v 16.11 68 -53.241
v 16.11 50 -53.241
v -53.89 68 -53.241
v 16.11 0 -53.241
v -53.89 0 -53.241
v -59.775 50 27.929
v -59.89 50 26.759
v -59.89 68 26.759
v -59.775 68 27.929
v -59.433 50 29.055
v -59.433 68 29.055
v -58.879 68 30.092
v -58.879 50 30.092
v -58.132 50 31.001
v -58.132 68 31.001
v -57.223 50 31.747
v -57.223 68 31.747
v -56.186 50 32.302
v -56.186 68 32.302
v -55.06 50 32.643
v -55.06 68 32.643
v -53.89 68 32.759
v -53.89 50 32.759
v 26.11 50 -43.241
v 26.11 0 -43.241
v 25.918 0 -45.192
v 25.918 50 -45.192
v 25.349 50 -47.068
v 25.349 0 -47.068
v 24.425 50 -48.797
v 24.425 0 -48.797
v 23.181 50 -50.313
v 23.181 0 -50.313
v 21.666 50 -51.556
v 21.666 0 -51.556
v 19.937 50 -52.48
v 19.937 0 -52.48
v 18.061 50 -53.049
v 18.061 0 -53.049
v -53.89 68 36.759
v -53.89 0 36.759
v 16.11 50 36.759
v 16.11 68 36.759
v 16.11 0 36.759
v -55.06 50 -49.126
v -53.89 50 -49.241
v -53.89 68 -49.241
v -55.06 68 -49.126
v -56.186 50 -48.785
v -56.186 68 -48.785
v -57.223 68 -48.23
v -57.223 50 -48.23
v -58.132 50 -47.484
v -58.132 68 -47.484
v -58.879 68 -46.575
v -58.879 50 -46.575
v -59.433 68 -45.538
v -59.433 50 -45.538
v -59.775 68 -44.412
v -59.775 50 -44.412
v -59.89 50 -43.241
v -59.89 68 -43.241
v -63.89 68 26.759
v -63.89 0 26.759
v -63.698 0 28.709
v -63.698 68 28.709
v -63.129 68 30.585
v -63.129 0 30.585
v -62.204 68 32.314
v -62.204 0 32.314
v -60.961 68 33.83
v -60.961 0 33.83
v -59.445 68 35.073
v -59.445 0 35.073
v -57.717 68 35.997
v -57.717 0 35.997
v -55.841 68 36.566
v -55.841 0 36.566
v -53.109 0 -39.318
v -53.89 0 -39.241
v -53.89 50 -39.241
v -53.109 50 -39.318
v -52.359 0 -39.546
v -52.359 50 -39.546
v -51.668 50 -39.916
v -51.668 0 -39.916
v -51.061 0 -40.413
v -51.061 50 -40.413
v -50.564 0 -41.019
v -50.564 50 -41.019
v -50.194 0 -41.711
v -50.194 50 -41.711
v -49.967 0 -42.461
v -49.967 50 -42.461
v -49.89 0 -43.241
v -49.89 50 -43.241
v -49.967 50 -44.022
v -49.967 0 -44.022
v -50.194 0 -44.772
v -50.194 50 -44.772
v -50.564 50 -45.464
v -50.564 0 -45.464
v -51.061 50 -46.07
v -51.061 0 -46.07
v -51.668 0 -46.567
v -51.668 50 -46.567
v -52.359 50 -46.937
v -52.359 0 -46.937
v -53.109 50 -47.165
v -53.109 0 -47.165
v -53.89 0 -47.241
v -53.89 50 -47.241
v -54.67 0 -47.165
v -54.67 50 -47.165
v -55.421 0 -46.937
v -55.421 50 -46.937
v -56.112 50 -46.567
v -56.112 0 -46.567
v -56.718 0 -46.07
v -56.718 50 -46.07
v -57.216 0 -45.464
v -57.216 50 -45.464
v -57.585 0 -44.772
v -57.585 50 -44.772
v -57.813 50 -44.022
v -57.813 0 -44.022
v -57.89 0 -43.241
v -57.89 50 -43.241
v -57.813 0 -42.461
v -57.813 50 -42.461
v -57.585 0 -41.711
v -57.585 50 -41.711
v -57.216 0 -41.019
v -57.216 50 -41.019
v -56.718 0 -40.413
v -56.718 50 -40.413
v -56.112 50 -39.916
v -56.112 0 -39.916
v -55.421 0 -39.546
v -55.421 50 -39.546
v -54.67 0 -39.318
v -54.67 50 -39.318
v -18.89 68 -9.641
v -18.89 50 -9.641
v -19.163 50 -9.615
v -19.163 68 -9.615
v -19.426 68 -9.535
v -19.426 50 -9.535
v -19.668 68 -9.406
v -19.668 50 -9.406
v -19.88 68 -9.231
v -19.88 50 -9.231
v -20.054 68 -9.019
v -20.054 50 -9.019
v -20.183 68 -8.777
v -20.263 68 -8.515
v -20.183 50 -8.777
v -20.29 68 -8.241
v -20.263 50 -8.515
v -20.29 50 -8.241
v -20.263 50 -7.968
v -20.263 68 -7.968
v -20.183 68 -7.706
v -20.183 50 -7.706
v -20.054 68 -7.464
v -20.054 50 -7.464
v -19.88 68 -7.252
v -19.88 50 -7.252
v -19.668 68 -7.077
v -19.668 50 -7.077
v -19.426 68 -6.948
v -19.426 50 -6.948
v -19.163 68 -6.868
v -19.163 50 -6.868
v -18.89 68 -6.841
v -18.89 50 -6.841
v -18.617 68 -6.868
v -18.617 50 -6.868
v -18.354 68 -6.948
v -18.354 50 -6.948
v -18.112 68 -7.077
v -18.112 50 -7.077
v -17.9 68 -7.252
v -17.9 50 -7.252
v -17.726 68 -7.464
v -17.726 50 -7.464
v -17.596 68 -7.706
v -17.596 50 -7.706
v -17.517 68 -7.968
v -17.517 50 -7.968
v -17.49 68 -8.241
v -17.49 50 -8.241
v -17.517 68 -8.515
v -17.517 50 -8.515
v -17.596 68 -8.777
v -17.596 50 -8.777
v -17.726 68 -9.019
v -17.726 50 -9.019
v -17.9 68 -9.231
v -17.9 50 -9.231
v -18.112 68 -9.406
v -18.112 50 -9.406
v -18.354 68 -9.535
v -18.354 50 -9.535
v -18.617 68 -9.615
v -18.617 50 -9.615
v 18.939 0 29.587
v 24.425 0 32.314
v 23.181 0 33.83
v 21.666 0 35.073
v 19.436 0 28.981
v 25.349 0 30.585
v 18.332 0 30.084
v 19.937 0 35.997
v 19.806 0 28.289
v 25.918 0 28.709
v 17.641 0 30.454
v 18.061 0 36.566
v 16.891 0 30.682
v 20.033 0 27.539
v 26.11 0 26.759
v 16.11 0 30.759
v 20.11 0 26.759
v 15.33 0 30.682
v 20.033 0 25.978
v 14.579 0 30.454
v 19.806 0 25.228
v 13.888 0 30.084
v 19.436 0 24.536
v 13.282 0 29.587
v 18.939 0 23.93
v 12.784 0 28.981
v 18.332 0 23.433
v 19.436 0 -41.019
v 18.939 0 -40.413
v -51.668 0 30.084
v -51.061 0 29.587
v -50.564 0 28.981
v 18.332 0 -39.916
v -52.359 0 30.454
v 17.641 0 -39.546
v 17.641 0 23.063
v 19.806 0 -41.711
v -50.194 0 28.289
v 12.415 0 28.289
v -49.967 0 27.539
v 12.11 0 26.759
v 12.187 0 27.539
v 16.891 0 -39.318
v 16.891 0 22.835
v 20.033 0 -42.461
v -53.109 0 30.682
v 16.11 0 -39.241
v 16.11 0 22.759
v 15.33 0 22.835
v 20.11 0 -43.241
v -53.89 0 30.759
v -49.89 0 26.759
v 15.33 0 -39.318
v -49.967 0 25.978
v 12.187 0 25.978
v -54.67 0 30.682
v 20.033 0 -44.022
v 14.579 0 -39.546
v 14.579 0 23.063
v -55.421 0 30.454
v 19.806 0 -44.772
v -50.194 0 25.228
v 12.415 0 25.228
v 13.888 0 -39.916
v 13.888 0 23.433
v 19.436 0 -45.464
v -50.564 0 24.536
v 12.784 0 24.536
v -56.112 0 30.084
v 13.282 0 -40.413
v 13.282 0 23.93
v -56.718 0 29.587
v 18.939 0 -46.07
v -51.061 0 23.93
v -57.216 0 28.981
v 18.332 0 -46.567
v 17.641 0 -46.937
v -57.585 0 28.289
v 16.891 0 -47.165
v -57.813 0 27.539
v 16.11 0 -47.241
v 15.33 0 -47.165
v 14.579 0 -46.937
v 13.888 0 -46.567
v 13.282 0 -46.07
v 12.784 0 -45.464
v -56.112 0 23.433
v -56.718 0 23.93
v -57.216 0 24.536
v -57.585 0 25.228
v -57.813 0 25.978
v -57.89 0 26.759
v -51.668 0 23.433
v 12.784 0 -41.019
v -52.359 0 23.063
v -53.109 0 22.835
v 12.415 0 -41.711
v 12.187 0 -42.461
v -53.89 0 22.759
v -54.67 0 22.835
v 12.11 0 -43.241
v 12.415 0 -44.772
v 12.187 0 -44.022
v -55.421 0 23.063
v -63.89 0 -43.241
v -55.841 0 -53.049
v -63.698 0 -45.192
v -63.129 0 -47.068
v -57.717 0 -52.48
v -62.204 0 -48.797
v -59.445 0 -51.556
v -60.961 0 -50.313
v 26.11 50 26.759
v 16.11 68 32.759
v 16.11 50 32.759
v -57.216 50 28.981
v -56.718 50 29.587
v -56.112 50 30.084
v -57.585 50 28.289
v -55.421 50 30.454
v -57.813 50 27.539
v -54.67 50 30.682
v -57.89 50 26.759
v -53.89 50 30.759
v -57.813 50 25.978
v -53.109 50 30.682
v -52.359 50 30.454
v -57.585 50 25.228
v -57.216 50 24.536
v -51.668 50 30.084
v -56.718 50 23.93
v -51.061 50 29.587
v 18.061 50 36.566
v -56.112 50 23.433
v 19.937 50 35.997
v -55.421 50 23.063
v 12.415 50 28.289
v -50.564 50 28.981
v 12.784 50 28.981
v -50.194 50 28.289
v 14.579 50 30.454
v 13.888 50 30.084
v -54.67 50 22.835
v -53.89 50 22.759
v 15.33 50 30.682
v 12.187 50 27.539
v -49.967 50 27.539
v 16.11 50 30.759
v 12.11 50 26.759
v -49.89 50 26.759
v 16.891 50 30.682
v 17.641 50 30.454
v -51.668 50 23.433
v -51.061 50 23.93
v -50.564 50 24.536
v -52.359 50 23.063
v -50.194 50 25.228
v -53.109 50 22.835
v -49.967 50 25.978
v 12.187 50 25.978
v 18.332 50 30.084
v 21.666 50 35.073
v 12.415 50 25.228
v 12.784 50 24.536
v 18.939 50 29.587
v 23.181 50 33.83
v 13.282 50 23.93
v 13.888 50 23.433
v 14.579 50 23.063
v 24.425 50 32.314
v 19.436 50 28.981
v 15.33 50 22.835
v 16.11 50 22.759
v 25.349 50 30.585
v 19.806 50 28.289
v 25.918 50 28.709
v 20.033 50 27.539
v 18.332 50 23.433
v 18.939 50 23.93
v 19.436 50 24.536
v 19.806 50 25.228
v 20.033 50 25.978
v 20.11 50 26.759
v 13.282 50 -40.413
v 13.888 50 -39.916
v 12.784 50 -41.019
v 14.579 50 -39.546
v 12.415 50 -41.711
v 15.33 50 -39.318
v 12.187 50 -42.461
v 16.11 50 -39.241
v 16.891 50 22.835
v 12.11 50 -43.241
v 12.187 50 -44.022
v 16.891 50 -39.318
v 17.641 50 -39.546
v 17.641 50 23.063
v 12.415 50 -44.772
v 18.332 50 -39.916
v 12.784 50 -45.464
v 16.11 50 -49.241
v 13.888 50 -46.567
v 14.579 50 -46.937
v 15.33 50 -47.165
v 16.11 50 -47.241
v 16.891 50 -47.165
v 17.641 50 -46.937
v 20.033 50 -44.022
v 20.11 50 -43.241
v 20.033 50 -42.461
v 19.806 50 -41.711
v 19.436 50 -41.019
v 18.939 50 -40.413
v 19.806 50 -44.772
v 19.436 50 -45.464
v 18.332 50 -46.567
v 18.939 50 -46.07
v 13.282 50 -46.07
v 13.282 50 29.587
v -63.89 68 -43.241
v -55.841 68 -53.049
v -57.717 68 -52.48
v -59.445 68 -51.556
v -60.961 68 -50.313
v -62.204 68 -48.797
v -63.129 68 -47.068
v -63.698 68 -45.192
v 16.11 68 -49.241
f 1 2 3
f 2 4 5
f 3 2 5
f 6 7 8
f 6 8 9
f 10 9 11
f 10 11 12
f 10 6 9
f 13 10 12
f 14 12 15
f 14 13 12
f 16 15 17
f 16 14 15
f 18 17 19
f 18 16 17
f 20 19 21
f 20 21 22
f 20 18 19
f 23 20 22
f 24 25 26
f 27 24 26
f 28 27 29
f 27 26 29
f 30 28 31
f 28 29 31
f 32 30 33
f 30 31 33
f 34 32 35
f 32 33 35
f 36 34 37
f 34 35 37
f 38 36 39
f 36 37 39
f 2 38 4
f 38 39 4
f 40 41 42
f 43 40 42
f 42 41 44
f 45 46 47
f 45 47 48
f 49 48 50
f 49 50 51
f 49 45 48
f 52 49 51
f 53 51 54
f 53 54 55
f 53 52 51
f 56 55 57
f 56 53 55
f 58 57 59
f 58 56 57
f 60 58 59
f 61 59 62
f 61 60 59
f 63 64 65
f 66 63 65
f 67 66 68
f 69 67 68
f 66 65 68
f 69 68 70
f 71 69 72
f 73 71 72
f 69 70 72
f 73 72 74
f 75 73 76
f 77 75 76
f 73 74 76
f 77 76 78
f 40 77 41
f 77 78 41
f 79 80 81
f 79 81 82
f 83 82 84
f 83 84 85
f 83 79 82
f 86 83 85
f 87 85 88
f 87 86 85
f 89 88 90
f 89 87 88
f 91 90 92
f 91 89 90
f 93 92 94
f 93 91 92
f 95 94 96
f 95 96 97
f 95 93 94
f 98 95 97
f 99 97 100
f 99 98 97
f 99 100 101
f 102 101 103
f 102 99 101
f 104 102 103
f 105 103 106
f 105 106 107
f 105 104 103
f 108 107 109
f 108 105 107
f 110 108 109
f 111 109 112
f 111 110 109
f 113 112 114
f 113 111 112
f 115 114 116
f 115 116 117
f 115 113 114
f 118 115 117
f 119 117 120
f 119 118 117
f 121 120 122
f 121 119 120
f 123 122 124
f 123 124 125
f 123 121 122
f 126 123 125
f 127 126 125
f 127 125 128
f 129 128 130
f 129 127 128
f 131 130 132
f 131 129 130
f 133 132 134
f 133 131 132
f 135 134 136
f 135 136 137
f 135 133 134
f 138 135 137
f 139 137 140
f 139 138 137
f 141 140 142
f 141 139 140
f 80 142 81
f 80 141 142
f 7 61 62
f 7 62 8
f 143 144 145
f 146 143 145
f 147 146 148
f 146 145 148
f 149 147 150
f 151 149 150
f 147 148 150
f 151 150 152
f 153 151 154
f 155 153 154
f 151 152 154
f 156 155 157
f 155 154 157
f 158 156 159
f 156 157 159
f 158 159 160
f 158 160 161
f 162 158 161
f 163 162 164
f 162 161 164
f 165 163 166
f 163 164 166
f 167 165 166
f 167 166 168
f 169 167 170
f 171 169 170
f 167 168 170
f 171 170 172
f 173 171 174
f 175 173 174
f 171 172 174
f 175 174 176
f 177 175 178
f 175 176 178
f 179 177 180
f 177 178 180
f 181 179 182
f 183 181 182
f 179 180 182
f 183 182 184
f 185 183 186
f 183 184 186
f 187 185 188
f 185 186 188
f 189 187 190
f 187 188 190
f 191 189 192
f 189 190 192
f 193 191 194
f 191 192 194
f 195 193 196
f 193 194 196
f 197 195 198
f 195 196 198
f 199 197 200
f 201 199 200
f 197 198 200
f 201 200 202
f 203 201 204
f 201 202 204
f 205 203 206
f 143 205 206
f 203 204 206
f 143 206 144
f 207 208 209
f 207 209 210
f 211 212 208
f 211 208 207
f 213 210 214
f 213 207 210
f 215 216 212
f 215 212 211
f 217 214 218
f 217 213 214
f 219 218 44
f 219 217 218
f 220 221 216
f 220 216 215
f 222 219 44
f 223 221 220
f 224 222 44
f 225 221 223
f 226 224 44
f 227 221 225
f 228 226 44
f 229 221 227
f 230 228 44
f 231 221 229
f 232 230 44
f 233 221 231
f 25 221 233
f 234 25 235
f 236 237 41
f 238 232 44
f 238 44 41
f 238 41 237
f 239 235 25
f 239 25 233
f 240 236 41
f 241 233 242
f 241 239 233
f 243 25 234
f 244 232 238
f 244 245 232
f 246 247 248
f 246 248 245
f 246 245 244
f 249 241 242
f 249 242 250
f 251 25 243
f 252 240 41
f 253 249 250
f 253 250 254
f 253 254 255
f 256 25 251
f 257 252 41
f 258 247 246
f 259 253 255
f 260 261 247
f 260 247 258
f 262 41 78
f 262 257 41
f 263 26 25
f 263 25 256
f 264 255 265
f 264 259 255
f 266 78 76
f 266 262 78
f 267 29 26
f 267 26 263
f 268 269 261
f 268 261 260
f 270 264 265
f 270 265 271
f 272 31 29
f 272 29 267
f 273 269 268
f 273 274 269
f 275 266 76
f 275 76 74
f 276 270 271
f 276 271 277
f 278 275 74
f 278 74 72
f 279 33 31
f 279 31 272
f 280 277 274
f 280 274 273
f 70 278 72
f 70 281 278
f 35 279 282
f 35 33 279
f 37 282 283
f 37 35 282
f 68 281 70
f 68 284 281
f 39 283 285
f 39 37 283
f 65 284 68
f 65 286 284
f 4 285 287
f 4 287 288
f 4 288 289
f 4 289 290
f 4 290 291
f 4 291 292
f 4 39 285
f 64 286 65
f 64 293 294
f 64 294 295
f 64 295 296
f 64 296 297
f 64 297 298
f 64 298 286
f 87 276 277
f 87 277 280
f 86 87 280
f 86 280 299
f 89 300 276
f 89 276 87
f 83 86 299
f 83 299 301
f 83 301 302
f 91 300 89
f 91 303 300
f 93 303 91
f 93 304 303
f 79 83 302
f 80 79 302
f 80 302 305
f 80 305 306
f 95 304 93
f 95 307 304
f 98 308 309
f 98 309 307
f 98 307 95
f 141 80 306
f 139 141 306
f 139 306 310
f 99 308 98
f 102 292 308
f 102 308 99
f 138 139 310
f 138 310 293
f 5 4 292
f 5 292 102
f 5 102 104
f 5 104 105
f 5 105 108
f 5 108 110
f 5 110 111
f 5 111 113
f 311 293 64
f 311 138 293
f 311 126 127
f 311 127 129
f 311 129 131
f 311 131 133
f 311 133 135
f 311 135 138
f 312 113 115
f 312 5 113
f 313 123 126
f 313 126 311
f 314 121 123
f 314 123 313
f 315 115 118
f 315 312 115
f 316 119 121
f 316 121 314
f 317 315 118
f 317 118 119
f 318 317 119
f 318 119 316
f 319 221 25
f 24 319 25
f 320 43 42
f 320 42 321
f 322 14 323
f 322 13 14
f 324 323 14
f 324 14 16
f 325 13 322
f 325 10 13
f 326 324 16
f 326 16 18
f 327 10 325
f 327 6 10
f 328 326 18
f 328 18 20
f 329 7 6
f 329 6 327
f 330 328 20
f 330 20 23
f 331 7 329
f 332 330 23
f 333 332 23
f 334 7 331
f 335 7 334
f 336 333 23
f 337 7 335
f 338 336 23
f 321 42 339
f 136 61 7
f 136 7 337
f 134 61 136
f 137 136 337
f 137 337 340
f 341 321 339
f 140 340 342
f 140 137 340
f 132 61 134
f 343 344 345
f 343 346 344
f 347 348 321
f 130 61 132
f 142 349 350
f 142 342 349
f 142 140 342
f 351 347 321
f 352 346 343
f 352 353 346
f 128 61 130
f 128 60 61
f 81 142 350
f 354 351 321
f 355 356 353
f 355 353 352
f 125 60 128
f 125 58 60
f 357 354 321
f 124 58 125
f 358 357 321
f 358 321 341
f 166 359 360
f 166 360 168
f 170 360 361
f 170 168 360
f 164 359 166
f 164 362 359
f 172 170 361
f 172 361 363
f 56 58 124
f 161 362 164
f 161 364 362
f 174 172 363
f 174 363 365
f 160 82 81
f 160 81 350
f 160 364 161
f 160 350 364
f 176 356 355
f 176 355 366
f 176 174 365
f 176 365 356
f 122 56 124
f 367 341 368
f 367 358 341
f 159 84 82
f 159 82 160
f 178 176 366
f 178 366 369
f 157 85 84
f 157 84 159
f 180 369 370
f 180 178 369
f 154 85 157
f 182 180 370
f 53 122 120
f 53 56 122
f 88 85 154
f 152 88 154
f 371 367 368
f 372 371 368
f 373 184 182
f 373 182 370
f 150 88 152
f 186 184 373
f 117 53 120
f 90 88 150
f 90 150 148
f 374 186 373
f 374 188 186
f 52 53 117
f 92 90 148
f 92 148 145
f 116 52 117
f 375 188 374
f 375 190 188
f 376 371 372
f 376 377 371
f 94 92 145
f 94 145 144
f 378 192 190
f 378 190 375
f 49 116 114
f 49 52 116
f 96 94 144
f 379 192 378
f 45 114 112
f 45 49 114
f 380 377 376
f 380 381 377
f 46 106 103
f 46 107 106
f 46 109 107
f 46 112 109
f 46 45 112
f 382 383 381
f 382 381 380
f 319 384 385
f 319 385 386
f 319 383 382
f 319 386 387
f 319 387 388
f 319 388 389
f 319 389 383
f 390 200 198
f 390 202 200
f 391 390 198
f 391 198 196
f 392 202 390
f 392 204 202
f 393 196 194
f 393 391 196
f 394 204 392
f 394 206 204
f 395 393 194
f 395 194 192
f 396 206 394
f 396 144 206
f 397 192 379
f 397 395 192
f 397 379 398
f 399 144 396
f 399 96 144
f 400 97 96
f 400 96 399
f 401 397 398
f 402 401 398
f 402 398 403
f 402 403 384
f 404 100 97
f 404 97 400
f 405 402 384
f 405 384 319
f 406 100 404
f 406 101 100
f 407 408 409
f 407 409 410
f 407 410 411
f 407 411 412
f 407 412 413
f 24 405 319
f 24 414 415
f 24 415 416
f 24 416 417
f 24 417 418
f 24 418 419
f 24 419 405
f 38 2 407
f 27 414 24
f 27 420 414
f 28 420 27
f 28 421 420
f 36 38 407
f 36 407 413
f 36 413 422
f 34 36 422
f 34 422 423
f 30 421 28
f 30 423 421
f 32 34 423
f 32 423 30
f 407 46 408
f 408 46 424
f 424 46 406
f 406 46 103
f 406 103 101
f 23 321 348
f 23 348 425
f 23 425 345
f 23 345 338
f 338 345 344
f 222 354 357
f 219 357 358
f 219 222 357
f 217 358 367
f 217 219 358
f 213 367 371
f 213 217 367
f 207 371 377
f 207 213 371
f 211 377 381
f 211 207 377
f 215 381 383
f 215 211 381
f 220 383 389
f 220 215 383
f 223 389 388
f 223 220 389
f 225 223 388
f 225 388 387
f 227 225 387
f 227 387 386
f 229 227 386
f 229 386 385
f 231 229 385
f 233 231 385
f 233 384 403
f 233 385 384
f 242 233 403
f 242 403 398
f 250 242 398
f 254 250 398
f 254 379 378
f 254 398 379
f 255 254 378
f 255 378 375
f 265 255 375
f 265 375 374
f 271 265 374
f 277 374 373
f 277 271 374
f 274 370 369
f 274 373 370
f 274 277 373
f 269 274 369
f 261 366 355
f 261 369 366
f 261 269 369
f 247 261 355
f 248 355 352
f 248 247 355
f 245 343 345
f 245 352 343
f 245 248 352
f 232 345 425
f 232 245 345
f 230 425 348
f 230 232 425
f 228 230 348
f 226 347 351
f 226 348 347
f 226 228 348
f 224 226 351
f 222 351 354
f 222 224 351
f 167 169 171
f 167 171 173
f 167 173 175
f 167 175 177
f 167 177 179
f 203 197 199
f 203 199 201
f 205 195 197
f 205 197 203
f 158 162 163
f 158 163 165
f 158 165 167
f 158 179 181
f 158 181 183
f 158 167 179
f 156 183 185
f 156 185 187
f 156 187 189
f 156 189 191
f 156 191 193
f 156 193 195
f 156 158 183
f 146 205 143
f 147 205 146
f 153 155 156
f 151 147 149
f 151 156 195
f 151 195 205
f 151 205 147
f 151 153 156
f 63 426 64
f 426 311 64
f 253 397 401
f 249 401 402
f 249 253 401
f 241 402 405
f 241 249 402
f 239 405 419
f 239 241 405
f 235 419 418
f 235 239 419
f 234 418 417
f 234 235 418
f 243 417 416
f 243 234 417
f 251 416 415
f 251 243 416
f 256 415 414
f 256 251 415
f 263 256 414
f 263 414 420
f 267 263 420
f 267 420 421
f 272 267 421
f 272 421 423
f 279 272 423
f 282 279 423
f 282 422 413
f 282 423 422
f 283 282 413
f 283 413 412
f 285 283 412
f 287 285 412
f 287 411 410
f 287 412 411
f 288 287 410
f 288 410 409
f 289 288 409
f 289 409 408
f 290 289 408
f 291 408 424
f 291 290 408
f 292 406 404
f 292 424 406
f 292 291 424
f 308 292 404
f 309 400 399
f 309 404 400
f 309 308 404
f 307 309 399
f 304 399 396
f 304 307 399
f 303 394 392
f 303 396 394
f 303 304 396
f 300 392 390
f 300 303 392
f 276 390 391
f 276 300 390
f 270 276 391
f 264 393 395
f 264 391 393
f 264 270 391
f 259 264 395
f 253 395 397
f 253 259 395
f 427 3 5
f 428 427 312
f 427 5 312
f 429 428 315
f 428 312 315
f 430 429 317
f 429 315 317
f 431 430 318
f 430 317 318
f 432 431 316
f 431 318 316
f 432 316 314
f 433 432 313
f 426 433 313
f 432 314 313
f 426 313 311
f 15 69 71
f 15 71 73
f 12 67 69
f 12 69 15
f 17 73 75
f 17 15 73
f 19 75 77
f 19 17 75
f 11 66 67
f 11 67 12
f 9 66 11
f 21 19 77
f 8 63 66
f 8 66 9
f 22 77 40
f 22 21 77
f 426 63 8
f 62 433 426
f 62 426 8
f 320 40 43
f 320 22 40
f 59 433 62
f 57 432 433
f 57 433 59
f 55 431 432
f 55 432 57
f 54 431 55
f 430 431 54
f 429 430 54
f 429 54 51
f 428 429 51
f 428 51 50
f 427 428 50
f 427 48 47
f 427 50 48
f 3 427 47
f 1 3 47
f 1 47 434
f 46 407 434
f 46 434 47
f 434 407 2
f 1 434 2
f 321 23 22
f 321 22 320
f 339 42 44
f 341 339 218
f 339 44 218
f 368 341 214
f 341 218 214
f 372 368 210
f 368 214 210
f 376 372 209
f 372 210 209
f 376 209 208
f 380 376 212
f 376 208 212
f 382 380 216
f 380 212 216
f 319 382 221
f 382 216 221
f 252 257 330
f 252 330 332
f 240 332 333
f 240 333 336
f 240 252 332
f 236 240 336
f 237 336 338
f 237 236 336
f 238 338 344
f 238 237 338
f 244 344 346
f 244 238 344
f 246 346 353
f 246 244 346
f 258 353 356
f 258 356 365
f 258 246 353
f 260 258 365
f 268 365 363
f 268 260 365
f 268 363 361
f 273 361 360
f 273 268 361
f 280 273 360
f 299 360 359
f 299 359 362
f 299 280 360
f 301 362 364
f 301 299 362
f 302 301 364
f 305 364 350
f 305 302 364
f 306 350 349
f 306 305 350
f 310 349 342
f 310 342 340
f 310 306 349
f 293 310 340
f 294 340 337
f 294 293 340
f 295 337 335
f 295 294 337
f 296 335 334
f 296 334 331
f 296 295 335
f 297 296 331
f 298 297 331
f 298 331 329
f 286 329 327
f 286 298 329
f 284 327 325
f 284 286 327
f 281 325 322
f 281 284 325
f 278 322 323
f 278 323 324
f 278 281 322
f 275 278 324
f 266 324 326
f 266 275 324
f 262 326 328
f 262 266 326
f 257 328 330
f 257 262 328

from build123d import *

# Parameters (mm, degrees)
SKETCH1_R           = 4
BOSS_EXTRUDE1_DEPTH = 50
EXTRUDE_THIN1_DEPTH = 18
SKETCH3_R           = 1.4
BOSS_EXTRUDE2_DEPTH = 18
SKETCH4_W           = 4.41201188
SKETCH4_H           = 70
CUT_EXTRUDE1_DEPTH  = 18
SKETCH5_W           = 12.080222771
SKETCH5_H           = 13.922777815
SKETCH5_W_2         = 14.701199749
SKETCH5_H_2         = 17.828925886
CUT_EXTRUDE2_DEPTH  = 18


with BuildPart() as part:
    # Sketch1 → Boss-Extrude1 (new body)
    with BuildSketch(Plane(origin=(0, 0, 0), x_dir=(1, 0, 0), z_dir=(0, 1, 0))):
        with BuildLine():
            Line((-53.889789303, 53.241491086), (16.110210697, 53.241491086))
            ThreePointArc((16.110210697, 53.241491086), (23.181278509, 50.312558898), (26.110210697, 43.241491086))
            Line((26.110210697, 43.241491086), (26.110210697, -26.758508914))
            ThreePointArc((26.110210697, -26.758508914), (23.181278509, -33.829576726), (16.110210697, -36.758508914))
            Line((16.110210697, -36.758508914), (-53.889789303, -36.758508914))
            ThreePointArc((-53.889789303, -36.758508914), (-60.960857115, -33.829576726), (-63.889789303, -26.758508914))
            Line((-63.889789303, -26.758508914), (-63.889789303, 43.241491086))
            ThreePointArc((-63.889789303, 43.241491086), (-60.960857115, 50.312558898), (-53.889789303, 53.241491086))
        make_face()
        with Locations(Location((-53.889789303, 43.241491086, 0), (0, 0, 270))):
            Circle(SKETCH1_R, mode=Mode.SUBTRACT)
        with Locations(Location((16.110210697, 43.241491086, 0), (0, 0, 270))):
            Circle(SKETCH1_R, mode=Mode.SUBTRACT)
        with Locations(Location((16.110210697, -26.758508914, 0), (0, 0, 270))):
            Circle(SKETCH1_R, mode=Mode.SUBTRACT)
        with Locations(Location((-53.889789303, -26.758508914, 0), (0, 0, 270))):
            Circle(SKETCH1_R, mode=Mode.SUBTRACT)
    extrude(amount=BOSS_EXTRUDE1_DEPTH)

    # Sketch2 → Extrude-Thin1 (add)
    with BuildSketch(Plane(origin=(0, 50, 0), x_dir=(1, 0, 0), z_dir=(0, 1, 0))):
        with BuildLine():
            Line((26.110210697, -26.758508914), (26.110210697, 43.241491086))
            ThreePointArc((26.110210697, 43.241491086), (23.181278509, 50.312558898), (16.110210697, 53.241491086))
            Line((16.110210697, 53.241491086), (-53.889789303, 53.241491086))
            ThreePointArc((-53.889789303, 53.241491086), (-60.960857115, 50.312558898), (-63.889789303, 43.241491086))
            Line((-63.889789303, 43.241491086), (-63.889789303, -26.758508914))
            ThreePointArc((-63.889789303, -26.758508914), (-60.960857115, -33.829576726), (-53.889789303, -36.758508914))
            Line((-53.889789303, -36.758508914), (16.110210697, -36.758508914))
            ThreePointArc((16.110210697, -36.758508914), (23.181278509, -33.829576726), (26.110210697, -26.758508914))
        make_face()
        with BuildLine():
            Line((22.110210697, -26.758508914), (22.110210697, 43.241491086))
            ThreePointArc((22.110210697, 43.241491086), (20.352851384, 47.484131773), (16.110210697, 49.241491086))
            Line((16.110210697, 49.241491086), (-53.889789303, 49.241491086))
            ThreePointArc((-53.889789303, 49.241491086), (-58.13242999, 47.484131773), (-59.889789303, 43.241491086))
            Line((-59.889789303, 43.241491086), (-59.889789303, -26.758508914))
            ThreePointArc((-59.889789303, -26.758508914), (-58.13242999, -31.001149601), (-53.889789303, -32.758508914))
            Line((-53.889789303, -32.758508914), (16.110210697, -32.758508914))
            ThreePointArc((16.110210697, -32.758508914), (20.352851384, -31.001149601), (22.110210697, -26.758508914))
        make_face(mode=Mode.SUBTRACT)
    extrude(amount=EXTRUDE_THIN1_DEPTH)

    # Sketch3 → Boss-Extrude2 (add)
    with BuildSketch(Plane(origin=(0, 50, 0), x_dir=(1, 0, 0), z_dir=(0, 1, 0))):
        with Locations(Location((-18.889789303, 8.241491086, 0), (0, 0, 90))):
            Circle(SKETCH3_R)
    extrude(amount=BOSS_EXTRUDE2_DEPTH)

    # Sketch4 → Cut-Extrude1 (cut)
    with BuildSketch(Plane(origin=(0, 68, 0), x_dir=(1, 0, 0), z_dir=(0, 1, 0))):
        with Locations((24.316216637, 8.241491086)):
            Rectangle(SKETCH4_W, SKETCH4_H)
    extrude(amount=-CUT_EXTRUDE1_DEPTH, mode=Mode.SUBTRACT)

    # Sketch5 → Cut-Extrude2 (cut)
    with BuildSketch(Plane(origin=(0, 68, 0), x_dir=(1, 0, 0), z_dir=(0, 1, 0))):
        with Locations((22.150322083, 46.280102179)):
            Rectangle(SKETCH5_W, SKETCH5_H)
        with Locations((23.460810572, -27.844045971)):
            Rectangle(SKETCH5_W_2, SKETCH5_H_2)
    extrude(amount=-CUT_EXTRUDE2_DEPTH, mode=Mode.SUBTRACT)


solid = part.part
